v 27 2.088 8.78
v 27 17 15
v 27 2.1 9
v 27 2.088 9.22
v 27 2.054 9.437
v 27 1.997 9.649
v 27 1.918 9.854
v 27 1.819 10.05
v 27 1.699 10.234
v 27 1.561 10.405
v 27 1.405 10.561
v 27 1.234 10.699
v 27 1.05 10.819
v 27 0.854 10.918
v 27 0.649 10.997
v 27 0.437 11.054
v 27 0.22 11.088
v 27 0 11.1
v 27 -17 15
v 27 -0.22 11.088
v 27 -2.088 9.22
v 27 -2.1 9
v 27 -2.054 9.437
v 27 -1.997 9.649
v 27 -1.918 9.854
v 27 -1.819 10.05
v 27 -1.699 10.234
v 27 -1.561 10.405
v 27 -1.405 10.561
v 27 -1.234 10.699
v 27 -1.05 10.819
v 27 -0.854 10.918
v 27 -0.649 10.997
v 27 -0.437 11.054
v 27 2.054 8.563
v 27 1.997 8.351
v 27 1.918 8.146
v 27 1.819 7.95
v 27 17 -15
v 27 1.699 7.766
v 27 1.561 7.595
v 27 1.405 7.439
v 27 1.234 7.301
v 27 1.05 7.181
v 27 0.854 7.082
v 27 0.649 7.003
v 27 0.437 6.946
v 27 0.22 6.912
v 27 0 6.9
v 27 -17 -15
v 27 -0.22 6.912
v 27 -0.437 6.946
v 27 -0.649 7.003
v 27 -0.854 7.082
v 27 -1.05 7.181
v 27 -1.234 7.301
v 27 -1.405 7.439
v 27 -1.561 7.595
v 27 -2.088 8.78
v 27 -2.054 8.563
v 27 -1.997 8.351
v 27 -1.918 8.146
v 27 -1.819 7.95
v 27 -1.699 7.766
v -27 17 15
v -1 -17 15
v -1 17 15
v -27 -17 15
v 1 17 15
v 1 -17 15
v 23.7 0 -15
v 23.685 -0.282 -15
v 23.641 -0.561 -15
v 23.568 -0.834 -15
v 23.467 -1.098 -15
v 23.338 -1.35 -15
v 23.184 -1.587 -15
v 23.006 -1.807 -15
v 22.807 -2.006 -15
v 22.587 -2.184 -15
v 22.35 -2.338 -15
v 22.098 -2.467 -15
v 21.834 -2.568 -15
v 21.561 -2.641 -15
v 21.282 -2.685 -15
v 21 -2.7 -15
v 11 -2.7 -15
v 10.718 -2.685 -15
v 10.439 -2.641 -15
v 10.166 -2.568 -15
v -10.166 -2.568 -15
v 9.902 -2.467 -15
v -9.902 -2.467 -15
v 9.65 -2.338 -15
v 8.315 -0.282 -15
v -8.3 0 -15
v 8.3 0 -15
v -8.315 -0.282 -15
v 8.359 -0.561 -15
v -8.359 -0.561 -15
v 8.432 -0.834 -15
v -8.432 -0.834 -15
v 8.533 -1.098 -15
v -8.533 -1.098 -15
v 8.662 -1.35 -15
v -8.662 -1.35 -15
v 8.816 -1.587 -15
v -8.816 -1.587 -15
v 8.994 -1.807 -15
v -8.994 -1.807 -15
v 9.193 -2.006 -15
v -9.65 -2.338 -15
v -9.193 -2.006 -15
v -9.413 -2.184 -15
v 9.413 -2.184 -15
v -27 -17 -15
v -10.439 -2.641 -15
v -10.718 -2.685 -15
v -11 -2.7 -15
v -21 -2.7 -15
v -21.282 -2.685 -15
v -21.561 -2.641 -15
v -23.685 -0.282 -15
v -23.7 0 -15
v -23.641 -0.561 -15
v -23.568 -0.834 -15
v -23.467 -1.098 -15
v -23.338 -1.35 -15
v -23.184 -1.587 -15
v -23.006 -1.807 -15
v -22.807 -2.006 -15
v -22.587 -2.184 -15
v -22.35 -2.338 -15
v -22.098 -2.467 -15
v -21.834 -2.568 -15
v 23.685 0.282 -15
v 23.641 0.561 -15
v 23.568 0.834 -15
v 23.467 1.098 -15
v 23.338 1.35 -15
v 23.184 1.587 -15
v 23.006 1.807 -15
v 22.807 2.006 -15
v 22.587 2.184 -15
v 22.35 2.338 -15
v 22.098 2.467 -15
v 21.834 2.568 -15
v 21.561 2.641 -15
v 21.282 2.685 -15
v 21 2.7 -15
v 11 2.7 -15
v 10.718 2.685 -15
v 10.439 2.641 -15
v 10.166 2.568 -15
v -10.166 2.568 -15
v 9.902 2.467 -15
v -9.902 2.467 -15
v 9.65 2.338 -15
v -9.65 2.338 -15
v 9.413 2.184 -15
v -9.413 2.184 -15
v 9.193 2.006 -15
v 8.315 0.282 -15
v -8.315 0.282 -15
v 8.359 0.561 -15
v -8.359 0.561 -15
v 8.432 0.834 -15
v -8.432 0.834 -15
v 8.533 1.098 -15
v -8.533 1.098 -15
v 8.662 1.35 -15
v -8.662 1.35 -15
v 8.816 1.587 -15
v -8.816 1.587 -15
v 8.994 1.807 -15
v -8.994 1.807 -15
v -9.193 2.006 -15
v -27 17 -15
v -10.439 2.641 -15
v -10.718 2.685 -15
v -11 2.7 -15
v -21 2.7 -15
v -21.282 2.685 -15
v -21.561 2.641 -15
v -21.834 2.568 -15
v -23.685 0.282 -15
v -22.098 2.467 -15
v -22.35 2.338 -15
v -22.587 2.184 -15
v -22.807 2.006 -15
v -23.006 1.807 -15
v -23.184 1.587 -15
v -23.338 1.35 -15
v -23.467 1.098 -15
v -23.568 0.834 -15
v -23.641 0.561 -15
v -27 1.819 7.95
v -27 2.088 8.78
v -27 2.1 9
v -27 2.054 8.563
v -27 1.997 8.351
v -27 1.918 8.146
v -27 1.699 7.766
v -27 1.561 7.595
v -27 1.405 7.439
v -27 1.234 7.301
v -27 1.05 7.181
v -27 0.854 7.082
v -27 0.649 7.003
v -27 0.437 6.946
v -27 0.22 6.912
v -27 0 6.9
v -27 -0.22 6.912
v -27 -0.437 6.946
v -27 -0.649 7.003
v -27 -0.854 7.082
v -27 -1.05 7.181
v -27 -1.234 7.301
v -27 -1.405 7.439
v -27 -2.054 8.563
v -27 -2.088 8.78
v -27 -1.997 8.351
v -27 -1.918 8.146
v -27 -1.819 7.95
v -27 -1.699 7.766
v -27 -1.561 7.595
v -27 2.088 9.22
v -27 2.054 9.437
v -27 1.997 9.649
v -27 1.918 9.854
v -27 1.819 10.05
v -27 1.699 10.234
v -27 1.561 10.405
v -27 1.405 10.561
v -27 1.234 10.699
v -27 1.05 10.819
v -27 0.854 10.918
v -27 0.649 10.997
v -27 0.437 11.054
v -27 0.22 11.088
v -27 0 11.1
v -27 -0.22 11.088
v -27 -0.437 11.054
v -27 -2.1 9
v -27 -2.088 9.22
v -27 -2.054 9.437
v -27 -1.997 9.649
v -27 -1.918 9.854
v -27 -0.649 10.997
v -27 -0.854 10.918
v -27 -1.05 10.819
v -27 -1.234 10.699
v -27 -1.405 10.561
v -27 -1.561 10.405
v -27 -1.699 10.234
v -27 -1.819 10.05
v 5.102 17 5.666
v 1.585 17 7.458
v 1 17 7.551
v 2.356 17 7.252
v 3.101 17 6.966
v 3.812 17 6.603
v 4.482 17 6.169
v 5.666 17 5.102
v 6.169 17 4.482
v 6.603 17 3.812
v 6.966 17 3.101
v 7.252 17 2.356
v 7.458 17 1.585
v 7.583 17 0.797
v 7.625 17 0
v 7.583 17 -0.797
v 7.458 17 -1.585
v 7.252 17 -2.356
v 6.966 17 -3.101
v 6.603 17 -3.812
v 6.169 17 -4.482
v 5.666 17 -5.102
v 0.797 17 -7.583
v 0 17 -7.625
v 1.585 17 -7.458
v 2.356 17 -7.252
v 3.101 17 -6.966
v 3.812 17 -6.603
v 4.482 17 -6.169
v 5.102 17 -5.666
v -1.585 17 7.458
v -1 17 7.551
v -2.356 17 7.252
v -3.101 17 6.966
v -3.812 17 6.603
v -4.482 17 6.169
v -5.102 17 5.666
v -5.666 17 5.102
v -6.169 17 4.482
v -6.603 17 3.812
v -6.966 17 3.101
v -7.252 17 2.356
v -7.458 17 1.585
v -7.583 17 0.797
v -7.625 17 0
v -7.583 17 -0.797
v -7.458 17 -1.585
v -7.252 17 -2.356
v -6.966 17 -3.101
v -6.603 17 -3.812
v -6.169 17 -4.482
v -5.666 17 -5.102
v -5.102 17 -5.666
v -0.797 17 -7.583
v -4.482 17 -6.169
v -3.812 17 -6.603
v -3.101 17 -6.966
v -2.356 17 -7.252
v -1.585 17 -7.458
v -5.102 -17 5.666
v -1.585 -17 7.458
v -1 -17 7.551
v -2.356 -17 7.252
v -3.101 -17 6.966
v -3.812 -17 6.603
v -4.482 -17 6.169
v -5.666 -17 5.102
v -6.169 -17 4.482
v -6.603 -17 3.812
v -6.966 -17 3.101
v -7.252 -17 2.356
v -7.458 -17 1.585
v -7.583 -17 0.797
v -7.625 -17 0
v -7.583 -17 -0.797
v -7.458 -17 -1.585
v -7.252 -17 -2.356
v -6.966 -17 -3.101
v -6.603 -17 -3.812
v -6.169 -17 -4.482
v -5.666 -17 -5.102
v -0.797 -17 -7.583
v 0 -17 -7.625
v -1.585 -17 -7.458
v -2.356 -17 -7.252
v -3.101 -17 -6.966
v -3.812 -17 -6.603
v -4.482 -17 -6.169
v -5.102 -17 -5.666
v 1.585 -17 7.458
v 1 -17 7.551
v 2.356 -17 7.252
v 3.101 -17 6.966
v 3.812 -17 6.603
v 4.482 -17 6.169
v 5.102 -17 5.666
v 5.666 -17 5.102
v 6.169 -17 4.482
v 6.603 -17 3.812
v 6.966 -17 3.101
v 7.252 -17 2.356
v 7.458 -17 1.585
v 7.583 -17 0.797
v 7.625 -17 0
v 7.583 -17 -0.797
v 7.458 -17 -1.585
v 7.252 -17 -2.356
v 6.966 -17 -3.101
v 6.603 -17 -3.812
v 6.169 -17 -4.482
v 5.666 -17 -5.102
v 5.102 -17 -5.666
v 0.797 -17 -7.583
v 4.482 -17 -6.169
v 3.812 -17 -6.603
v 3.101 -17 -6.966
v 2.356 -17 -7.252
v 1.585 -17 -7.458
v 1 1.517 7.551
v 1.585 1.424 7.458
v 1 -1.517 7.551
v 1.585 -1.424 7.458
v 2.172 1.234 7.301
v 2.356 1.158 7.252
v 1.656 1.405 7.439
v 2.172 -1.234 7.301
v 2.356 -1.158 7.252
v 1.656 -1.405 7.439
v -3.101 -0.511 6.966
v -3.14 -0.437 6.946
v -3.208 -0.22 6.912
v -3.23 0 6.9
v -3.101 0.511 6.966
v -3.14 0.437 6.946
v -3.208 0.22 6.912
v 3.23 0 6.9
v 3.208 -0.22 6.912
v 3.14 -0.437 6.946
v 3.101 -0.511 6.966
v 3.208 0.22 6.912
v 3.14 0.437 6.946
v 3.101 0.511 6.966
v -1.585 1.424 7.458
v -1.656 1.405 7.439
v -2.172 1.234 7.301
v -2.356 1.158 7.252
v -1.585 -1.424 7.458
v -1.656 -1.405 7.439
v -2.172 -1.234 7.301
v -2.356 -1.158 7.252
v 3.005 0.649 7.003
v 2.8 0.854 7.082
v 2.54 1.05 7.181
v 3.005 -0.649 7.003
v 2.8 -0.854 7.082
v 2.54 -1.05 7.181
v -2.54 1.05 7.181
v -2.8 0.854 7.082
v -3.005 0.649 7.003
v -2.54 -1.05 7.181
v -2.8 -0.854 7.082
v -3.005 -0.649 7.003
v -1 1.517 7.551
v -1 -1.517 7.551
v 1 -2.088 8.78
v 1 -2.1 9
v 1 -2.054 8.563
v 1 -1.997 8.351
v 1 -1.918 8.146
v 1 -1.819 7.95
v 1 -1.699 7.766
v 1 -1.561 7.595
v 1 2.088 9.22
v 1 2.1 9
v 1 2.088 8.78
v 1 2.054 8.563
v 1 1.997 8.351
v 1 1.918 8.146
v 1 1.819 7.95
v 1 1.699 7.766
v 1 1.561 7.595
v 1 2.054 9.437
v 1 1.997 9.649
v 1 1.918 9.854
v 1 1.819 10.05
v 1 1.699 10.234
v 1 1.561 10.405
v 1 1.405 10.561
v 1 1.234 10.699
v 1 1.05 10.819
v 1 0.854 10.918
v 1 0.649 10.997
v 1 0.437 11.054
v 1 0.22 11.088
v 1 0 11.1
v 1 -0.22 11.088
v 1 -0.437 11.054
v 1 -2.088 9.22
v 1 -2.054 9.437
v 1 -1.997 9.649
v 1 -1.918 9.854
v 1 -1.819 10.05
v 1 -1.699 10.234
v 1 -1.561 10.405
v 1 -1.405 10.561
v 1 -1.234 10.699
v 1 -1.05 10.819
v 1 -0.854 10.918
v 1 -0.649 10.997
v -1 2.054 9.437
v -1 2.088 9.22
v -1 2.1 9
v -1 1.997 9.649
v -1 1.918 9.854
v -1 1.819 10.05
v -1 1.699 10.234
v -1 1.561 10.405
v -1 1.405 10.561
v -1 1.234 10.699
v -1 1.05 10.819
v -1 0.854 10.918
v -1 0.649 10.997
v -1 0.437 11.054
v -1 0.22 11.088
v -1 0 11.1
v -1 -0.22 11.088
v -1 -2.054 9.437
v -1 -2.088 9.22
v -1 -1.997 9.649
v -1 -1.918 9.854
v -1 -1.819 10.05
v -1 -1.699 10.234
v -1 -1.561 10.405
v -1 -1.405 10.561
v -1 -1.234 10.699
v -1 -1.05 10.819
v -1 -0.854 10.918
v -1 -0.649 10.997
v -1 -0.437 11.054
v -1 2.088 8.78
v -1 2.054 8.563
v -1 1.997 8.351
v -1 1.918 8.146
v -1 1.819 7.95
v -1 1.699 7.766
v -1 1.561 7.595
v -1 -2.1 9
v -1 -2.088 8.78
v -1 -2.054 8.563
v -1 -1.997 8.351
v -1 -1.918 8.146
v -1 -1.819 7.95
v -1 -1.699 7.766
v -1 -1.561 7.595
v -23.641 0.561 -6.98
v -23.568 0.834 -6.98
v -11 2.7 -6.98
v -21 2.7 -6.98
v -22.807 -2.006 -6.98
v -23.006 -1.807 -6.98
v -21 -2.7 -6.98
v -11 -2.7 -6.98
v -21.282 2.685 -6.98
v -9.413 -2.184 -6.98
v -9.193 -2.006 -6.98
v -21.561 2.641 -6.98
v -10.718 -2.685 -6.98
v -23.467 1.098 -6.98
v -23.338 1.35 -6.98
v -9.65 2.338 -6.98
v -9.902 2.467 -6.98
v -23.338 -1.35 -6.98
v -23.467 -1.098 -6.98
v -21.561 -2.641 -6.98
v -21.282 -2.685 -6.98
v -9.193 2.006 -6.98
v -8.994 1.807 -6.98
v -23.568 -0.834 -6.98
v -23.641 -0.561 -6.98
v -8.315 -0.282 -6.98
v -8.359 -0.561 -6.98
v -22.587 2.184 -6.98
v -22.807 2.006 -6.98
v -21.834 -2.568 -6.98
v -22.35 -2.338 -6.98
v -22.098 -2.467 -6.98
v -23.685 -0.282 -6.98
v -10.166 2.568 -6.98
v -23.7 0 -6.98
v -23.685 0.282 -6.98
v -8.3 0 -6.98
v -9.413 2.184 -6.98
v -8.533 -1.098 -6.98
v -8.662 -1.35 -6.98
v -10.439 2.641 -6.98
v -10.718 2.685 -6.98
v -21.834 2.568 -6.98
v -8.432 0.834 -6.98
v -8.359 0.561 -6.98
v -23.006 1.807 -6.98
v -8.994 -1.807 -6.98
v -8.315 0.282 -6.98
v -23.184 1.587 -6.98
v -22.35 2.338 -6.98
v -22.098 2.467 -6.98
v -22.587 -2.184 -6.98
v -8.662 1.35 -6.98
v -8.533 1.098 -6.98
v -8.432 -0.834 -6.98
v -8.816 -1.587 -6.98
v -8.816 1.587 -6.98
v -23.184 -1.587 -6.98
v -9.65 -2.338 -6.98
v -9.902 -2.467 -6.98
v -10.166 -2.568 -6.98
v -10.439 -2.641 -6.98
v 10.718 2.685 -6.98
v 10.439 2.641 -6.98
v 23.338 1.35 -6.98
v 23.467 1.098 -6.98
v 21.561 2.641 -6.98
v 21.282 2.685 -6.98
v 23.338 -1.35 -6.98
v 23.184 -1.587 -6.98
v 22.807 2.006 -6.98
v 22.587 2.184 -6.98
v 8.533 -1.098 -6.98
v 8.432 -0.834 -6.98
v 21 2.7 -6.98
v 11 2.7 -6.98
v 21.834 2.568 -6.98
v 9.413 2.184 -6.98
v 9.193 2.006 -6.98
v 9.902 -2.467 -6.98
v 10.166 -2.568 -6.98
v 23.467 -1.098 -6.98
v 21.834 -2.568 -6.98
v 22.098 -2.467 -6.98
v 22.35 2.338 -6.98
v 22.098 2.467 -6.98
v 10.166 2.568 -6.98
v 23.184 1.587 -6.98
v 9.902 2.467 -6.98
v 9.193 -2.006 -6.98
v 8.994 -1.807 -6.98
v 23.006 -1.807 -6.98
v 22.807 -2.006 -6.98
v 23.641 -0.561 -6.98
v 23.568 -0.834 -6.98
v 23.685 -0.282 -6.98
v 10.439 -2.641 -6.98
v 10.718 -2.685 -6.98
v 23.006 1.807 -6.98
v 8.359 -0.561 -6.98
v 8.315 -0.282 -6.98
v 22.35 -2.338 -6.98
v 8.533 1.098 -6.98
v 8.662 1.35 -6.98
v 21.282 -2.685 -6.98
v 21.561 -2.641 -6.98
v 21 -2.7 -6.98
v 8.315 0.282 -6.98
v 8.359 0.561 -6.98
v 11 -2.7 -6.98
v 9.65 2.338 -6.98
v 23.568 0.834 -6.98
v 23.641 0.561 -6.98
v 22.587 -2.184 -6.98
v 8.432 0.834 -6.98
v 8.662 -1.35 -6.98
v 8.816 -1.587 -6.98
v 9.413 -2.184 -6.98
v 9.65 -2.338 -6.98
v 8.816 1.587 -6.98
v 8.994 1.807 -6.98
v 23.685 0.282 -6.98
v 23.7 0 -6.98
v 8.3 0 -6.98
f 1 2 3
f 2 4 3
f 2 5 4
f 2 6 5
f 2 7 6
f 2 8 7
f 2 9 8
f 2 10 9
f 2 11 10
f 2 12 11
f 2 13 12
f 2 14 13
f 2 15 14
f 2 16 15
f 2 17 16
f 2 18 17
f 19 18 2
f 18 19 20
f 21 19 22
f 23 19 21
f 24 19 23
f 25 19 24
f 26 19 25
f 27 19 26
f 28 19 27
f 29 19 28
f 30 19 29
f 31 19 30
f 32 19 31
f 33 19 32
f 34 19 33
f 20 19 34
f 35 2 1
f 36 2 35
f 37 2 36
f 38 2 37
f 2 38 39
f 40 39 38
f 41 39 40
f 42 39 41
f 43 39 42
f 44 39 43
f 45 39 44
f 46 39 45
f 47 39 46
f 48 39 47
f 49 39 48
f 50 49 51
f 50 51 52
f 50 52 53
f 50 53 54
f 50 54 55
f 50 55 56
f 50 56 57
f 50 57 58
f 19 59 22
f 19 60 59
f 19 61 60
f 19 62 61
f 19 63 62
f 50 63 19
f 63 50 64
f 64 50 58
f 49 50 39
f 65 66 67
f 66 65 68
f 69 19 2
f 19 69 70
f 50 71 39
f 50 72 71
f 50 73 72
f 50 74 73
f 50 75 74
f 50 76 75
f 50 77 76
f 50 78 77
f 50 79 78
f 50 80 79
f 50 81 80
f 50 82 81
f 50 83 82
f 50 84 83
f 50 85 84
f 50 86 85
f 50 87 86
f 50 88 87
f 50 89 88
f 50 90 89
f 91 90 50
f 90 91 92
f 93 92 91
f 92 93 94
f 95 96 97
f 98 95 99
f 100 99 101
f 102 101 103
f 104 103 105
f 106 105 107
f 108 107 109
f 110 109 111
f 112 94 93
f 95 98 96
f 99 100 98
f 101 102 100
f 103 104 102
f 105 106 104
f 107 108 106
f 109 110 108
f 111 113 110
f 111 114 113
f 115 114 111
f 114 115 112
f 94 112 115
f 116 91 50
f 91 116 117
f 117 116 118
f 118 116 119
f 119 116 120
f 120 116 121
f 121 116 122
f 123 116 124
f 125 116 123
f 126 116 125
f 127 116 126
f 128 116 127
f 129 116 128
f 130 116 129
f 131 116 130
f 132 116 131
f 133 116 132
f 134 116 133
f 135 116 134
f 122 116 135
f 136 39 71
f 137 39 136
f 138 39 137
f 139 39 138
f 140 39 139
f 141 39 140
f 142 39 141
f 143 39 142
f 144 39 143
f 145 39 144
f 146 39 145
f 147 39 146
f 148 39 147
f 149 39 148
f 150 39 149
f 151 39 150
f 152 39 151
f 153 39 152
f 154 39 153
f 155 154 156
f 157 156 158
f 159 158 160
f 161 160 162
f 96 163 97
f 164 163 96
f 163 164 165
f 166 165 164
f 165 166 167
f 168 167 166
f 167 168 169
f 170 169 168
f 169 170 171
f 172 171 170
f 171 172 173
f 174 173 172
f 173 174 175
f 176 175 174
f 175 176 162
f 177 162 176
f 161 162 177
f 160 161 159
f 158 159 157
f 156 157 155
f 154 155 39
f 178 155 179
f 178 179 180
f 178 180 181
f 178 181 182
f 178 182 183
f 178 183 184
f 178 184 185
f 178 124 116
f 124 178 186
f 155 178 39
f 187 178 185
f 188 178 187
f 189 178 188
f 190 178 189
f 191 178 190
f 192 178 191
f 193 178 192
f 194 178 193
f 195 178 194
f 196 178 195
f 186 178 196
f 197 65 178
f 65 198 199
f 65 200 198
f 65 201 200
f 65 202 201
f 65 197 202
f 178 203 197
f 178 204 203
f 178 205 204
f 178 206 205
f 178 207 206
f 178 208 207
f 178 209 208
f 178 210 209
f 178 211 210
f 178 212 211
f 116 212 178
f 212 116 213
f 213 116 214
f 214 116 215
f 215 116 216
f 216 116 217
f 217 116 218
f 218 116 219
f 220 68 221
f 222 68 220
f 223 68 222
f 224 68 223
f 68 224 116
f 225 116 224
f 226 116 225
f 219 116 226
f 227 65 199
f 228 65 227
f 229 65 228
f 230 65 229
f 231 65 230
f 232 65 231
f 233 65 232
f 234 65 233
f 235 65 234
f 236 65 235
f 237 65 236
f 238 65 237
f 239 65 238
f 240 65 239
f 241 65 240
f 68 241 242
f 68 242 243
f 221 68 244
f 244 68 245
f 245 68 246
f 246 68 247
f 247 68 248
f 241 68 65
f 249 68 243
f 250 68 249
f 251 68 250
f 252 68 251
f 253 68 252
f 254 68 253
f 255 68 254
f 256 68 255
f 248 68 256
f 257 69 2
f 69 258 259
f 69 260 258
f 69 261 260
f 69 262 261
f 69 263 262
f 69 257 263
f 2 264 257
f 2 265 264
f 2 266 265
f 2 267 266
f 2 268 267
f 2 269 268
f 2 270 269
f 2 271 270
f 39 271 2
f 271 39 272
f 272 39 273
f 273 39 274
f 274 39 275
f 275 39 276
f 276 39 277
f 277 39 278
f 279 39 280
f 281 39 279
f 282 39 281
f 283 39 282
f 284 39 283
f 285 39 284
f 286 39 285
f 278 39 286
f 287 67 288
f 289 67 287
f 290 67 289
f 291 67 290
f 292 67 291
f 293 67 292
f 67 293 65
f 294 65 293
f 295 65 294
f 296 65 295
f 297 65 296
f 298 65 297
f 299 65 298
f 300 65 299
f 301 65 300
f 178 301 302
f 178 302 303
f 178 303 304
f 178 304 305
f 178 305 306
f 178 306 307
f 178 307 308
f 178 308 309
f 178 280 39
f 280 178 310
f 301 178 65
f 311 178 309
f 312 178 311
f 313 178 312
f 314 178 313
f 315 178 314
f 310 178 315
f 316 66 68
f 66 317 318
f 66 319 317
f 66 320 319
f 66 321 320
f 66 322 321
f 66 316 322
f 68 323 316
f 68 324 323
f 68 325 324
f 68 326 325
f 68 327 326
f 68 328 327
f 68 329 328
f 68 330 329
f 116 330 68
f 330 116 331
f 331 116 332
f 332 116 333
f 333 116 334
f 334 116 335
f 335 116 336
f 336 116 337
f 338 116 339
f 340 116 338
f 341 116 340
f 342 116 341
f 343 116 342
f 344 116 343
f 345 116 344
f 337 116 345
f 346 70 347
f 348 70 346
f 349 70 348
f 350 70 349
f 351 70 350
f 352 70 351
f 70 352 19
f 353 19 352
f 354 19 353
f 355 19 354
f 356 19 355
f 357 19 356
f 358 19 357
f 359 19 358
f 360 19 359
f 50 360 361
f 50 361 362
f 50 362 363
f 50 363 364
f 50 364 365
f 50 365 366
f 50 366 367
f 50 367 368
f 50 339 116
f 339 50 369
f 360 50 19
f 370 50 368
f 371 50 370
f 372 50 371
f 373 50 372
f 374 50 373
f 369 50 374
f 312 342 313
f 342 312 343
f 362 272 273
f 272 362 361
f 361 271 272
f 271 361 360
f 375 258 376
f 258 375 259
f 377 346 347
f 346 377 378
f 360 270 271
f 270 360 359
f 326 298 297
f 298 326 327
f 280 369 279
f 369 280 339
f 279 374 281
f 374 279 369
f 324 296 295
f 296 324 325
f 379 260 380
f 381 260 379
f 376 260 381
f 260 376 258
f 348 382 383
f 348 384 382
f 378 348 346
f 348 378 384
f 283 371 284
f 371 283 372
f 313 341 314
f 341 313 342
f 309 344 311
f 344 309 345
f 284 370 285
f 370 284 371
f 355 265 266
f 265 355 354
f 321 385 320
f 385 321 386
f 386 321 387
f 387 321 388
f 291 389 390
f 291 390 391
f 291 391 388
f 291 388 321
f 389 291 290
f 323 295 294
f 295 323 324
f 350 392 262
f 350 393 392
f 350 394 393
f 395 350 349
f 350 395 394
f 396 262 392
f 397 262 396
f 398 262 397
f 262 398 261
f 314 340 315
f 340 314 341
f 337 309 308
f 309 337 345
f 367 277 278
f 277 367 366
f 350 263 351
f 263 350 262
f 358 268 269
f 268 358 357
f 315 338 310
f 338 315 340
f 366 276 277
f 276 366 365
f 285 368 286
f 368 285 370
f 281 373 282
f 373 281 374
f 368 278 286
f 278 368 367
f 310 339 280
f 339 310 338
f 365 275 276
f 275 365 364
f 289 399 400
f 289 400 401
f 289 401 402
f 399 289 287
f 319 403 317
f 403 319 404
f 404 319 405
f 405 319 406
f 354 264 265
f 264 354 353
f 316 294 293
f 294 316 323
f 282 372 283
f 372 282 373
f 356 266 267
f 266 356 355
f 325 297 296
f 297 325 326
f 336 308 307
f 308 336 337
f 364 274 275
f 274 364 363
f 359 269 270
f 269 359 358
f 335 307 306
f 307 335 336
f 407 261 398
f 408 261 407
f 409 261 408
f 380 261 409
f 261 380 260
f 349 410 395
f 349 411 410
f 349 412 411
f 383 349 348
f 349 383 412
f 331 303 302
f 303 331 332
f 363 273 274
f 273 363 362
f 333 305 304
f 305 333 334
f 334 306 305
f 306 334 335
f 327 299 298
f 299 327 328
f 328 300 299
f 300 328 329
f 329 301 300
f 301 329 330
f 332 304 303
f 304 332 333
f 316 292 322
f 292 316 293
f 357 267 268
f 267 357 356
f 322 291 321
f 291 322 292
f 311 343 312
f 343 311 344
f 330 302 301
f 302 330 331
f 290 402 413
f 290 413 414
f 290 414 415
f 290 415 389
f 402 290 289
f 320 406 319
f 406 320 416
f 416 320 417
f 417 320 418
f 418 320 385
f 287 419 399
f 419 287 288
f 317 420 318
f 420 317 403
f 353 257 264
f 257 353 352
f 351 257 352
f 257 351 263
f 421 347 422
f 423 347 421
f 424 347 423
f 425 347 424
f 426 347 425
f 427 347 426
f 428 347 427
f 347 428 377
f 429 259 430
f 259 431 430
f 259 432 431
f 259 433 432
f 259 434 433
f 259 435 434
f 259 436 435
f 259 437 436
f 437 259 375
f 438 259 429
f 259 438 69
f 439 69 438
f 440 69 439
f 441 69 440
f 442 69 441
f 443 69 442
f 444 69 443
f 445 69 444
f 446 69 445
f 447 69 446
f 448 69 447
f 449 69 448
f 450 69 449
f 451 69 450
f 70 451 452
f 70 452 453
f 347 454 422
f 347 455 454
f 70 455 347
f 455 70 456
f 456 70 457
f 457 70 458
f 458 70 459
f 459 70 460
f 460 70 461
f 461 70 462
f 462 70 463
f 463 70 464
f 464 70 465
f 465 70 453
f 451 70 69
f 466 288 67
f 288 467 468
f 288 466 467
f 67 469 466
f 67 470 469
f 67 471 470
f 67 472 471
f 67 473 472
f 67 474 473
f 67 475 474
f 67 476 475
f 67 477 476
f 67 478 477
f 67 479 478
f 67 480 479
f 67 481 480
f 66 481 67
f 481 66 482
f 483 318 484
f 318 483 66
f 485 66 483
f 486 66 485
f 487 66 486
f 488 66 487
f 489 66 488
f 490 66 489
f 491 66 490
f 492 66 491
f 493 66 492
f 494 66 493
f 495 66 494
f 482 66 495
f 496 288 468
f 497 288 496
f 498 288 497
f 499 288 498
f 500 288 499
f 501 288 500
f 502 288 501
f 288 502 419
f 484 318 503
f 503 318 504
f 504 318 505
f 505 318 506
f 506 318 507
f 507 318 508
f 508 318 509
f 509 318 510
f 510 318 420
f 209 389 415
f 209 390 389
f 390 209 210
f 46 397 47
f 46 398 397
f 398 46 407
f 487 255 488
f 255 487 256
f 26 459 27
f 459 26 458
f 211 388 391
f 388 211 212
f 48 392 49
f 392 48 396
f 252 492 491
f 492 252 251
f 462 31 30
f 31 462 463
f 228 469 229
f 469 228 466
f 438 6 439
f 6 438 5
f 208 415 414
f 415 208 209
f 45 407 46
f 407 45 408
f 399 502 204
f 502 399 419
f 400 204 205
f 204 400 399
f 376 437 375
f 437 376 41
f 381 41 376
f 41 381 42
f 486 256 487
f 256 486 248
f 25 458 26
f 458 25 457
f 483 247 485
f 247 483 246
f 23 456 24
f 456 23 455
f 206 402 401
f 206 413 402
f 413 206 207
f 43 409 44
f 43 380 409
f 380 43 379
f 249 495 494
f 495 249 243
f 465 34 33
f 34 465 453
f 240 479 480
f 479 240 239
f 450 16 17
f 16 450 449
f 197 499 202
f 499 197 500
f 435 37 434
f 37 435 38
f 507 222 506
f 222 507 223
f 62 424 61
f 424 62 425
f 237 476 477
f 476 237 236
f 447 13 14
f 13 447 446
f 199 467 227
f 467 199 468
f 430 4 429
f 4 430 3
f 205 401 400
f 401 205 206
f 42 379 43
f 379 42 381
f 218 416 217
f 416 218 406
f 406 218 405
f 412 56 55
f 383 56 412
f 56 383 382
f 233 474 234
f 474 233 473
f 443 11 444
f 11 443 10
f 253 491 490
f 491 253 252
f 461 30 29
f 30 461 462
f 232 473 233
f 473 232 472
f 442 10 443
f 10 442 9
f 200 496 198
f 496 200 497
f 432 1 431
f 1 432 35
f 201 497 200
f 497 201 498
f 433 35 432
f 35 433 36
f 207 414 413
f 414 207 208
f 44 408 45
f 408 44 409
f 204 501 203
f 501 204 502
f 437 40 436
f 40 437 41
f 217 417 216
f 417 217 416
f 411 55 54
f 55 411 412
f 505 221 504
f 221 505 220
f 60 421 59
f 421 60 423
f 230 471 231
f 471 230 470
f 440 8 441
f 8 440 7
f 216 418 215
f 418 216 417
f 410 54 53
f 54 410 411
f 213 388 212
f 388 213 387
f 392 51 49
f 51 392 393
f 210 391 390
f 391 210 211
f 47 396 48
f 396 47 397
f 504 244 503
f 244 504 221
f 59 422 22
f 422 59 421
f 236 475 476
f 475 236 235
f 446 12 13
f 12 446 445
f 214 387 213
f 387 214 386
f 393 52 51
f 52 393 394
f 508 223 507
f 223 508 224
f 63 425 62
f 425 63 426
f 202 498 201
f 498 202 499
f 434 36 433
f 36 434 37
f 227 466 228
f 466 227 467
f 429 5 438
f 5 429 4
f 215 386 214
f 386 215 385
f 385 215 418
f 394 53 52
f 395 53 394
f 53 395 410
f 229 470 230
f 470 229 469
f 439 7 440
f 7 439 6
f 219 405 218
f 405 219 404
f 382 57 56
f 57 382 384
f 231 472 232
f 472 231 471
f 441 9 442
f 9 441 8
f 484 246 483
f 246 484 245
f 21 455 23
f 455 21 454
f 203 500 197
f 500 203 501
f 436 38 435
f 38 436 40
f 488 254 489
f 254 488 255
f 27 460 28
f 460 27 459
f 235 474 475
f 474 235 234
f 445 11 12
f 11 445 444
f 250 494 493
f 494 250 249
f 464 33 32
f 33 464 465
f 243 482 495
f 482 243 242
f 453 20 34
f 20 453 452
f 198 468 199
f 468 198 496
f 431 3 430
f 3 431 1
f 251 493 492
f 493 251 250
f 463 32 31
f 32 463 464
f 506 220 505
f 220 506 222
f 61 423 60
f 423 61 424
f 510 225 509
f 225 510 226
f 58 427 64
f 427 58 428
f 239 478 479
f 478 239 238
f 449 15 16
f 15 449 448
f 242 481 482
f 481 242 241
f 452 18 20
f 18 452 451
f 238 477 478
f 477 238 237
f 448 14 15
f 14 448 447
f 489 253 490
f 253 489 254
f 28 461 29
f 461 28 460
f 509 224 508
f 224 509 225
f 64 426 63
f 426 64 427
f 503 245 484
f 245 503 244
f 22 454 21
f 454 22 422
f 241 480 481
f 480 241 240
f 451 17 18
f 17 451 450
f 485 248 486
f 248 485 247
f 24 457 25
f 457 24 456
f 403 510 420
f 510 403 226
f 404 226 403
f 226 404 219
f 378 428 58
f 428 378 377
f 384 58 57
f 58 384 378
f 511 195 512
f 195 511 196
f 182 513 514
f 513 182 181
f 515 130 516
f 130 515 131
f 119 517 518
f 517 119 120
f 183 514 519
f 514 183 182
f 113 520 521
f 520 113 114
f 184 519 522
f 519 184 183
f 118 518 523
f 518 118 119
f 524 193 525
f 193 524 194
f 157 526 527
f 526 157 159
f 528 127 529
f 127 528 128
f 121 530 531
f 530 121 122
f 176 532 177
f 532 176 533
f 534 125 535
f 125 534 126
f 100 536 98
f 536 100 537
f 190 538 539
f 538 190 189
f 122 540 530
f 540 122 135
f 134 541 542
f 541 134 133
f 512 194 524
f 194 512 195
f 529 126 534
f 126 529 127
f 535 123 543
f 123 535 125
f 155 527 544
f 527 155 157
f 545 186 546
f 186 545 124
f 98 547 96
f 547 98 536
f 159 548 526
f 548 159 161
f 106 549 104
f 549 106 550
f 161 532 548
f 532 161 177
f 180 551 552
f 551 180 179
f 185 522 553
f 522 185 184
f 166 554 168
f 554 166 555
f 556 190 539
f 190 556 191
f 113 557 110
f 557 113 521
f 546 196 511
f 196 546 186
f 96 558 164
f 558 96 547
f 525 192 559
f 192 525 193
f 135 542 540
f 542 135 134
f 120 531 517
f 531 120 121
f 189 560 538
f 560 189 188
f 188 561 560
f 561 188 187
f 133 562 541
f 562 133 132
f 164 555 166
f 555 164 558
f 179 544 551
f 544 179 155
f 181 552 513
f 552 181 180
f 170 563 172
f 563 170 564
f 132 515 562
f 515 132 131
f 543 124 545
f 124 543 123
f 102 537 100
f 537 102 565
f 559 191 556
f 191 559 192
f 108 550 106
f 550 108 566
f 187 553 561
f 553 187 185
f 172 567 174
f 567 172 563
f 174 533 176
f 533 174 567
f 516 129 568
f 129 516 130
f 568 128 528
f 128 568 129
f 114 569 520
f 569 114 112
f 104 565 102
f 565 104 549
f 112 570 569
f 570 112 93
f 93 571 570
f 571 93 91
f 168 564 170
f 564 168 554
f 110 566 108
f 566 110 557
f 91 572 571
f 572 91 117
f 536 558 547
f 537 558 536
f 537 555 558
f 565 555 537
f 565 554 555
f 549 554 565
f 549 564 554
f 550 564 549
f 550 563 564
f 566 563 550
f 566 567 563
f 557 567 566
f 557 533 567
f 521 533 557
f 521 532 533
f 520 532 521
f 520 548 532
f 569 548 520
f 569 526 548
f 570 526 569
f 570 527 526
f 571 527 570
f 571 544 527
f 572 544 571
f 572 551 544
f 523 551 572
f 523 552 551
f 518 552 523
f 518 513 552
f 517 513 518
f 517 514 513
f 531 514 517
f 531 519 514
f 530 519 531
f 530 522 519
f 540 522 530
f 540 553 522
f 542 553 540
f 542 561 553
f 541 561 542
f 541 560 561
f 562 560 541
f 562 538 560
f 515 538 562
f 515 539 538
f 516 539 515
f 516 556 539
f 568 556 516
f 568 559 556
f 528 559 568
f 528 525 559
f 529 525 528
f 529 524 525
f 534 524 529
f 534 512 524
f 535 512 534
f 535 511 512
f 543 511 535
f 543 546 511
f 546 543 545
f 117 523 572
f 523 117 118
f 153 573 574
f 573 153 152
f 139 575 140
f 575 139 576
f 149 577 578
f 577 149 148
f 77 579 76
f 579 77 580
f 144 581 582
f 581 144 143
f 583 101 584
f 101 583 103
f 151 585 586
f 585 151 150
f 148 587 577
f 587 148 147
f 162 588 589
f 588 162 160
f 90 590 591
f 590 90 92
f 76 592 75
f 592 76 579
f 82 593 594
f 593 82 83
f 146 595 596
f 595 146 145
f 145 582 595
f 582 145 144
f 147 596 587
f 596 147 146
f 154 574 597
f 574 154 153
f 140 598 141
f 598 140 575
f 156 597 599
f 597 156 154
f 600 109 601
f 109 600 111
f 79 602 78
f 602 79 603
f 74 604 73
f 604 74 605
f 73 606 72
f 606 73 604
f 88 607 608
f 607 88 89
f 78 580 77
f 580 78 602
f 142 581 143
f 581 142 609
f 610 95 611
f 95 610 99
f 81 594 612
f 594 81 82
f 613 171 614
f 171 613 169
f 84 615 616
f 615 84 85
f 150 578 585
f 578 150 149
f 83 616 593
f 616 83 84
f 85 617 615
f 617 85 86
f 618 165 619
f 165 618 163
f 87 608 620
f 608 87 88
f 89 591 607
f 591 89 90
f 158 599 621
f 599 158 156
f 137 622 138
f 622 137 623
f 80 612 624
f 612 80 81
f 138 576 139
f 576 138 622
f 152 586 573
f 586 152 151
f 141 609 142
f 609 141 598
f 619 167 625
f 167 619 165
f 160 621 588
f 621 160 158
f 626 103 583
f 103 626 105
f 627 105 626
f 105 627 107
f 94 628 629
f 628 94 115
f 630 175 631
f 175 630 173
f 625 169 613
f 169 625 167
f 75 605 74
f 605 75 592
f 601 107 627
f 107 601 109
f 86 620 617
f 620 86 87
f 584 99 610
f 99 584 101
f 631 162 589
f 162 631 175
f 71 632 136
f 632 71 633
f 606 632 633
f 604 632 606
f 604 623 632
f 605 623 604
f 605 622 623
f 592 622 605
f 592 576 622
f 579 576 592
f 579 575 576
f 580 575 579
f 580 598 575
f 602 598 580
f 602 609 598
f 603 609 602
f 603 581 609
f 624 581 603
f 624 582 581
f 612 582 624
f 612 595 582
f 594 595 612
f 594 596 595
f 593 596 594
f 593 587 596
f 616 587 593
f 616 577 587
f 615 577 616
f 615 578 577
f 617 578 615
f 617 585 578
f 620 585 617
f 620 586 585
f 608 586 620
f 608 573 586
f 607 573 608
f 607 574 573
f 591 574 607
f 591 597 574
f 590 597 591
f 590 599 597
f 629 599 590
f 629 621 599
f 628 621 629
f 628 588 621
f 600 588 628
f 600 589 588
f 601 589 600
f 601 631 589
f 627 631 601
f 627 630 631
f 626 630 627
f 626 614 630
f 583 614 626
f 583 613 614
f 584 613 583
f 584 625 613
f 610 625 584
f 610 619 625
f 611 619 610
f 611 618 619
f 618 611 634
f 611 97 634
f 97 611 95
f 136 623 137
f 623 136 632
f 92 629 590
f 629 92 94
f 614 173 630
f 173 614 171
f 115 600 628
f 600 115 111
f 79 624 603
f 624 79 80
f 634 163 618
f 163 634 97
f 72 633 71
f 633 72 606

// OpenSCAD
// LM8UU split housing: split linear-bearing housing with mounting slots.
$fn = 60;
eps = 0.02;
bearing_d = 15;
body_l = 54;
body_d = 34;
body_h = 30;
slot_w = 2;
clamp_screw_d = 4.2;
mount_slot_l = 10;
mount_slot_d = 5.4;

module mount_slot(x) {
    hull() {
        translate([x - mount_slot_l / 2, 0, -body_h / 2 - eps]) cylinder(d = mount_slot_d, h = 8 + 2 * eps);
        translate([x + mount_slot_l / 2, 0, -body_h / 2 - eps]) cylinder(d = mount_slot_d, h = 8 + 2 * eps);
    }
}

difference() {
    cube([body_l, body_d, body_h], center = true);
    translate([0, -body_d / 2 - eps, 0])
        rotate([-90, 0, 0]) cylinder(d = bearing_d + 0.25, h = body_d + 2 * eps);
    translate([-slot_w / 2, -body_d / 2 - eps, 0]) cube([slot_w, body_d + 2 * eps, body_h / 2 + eps]);
    translate([-body_l / 2 - eps, 0, body_h / 2 - 6])
        rotate([0, 90, 0]) cylinder(d = clamp_screw_d, h = body_l + 2 * eps);
    mount_slot(-16);
    mount_slot(16);
}
